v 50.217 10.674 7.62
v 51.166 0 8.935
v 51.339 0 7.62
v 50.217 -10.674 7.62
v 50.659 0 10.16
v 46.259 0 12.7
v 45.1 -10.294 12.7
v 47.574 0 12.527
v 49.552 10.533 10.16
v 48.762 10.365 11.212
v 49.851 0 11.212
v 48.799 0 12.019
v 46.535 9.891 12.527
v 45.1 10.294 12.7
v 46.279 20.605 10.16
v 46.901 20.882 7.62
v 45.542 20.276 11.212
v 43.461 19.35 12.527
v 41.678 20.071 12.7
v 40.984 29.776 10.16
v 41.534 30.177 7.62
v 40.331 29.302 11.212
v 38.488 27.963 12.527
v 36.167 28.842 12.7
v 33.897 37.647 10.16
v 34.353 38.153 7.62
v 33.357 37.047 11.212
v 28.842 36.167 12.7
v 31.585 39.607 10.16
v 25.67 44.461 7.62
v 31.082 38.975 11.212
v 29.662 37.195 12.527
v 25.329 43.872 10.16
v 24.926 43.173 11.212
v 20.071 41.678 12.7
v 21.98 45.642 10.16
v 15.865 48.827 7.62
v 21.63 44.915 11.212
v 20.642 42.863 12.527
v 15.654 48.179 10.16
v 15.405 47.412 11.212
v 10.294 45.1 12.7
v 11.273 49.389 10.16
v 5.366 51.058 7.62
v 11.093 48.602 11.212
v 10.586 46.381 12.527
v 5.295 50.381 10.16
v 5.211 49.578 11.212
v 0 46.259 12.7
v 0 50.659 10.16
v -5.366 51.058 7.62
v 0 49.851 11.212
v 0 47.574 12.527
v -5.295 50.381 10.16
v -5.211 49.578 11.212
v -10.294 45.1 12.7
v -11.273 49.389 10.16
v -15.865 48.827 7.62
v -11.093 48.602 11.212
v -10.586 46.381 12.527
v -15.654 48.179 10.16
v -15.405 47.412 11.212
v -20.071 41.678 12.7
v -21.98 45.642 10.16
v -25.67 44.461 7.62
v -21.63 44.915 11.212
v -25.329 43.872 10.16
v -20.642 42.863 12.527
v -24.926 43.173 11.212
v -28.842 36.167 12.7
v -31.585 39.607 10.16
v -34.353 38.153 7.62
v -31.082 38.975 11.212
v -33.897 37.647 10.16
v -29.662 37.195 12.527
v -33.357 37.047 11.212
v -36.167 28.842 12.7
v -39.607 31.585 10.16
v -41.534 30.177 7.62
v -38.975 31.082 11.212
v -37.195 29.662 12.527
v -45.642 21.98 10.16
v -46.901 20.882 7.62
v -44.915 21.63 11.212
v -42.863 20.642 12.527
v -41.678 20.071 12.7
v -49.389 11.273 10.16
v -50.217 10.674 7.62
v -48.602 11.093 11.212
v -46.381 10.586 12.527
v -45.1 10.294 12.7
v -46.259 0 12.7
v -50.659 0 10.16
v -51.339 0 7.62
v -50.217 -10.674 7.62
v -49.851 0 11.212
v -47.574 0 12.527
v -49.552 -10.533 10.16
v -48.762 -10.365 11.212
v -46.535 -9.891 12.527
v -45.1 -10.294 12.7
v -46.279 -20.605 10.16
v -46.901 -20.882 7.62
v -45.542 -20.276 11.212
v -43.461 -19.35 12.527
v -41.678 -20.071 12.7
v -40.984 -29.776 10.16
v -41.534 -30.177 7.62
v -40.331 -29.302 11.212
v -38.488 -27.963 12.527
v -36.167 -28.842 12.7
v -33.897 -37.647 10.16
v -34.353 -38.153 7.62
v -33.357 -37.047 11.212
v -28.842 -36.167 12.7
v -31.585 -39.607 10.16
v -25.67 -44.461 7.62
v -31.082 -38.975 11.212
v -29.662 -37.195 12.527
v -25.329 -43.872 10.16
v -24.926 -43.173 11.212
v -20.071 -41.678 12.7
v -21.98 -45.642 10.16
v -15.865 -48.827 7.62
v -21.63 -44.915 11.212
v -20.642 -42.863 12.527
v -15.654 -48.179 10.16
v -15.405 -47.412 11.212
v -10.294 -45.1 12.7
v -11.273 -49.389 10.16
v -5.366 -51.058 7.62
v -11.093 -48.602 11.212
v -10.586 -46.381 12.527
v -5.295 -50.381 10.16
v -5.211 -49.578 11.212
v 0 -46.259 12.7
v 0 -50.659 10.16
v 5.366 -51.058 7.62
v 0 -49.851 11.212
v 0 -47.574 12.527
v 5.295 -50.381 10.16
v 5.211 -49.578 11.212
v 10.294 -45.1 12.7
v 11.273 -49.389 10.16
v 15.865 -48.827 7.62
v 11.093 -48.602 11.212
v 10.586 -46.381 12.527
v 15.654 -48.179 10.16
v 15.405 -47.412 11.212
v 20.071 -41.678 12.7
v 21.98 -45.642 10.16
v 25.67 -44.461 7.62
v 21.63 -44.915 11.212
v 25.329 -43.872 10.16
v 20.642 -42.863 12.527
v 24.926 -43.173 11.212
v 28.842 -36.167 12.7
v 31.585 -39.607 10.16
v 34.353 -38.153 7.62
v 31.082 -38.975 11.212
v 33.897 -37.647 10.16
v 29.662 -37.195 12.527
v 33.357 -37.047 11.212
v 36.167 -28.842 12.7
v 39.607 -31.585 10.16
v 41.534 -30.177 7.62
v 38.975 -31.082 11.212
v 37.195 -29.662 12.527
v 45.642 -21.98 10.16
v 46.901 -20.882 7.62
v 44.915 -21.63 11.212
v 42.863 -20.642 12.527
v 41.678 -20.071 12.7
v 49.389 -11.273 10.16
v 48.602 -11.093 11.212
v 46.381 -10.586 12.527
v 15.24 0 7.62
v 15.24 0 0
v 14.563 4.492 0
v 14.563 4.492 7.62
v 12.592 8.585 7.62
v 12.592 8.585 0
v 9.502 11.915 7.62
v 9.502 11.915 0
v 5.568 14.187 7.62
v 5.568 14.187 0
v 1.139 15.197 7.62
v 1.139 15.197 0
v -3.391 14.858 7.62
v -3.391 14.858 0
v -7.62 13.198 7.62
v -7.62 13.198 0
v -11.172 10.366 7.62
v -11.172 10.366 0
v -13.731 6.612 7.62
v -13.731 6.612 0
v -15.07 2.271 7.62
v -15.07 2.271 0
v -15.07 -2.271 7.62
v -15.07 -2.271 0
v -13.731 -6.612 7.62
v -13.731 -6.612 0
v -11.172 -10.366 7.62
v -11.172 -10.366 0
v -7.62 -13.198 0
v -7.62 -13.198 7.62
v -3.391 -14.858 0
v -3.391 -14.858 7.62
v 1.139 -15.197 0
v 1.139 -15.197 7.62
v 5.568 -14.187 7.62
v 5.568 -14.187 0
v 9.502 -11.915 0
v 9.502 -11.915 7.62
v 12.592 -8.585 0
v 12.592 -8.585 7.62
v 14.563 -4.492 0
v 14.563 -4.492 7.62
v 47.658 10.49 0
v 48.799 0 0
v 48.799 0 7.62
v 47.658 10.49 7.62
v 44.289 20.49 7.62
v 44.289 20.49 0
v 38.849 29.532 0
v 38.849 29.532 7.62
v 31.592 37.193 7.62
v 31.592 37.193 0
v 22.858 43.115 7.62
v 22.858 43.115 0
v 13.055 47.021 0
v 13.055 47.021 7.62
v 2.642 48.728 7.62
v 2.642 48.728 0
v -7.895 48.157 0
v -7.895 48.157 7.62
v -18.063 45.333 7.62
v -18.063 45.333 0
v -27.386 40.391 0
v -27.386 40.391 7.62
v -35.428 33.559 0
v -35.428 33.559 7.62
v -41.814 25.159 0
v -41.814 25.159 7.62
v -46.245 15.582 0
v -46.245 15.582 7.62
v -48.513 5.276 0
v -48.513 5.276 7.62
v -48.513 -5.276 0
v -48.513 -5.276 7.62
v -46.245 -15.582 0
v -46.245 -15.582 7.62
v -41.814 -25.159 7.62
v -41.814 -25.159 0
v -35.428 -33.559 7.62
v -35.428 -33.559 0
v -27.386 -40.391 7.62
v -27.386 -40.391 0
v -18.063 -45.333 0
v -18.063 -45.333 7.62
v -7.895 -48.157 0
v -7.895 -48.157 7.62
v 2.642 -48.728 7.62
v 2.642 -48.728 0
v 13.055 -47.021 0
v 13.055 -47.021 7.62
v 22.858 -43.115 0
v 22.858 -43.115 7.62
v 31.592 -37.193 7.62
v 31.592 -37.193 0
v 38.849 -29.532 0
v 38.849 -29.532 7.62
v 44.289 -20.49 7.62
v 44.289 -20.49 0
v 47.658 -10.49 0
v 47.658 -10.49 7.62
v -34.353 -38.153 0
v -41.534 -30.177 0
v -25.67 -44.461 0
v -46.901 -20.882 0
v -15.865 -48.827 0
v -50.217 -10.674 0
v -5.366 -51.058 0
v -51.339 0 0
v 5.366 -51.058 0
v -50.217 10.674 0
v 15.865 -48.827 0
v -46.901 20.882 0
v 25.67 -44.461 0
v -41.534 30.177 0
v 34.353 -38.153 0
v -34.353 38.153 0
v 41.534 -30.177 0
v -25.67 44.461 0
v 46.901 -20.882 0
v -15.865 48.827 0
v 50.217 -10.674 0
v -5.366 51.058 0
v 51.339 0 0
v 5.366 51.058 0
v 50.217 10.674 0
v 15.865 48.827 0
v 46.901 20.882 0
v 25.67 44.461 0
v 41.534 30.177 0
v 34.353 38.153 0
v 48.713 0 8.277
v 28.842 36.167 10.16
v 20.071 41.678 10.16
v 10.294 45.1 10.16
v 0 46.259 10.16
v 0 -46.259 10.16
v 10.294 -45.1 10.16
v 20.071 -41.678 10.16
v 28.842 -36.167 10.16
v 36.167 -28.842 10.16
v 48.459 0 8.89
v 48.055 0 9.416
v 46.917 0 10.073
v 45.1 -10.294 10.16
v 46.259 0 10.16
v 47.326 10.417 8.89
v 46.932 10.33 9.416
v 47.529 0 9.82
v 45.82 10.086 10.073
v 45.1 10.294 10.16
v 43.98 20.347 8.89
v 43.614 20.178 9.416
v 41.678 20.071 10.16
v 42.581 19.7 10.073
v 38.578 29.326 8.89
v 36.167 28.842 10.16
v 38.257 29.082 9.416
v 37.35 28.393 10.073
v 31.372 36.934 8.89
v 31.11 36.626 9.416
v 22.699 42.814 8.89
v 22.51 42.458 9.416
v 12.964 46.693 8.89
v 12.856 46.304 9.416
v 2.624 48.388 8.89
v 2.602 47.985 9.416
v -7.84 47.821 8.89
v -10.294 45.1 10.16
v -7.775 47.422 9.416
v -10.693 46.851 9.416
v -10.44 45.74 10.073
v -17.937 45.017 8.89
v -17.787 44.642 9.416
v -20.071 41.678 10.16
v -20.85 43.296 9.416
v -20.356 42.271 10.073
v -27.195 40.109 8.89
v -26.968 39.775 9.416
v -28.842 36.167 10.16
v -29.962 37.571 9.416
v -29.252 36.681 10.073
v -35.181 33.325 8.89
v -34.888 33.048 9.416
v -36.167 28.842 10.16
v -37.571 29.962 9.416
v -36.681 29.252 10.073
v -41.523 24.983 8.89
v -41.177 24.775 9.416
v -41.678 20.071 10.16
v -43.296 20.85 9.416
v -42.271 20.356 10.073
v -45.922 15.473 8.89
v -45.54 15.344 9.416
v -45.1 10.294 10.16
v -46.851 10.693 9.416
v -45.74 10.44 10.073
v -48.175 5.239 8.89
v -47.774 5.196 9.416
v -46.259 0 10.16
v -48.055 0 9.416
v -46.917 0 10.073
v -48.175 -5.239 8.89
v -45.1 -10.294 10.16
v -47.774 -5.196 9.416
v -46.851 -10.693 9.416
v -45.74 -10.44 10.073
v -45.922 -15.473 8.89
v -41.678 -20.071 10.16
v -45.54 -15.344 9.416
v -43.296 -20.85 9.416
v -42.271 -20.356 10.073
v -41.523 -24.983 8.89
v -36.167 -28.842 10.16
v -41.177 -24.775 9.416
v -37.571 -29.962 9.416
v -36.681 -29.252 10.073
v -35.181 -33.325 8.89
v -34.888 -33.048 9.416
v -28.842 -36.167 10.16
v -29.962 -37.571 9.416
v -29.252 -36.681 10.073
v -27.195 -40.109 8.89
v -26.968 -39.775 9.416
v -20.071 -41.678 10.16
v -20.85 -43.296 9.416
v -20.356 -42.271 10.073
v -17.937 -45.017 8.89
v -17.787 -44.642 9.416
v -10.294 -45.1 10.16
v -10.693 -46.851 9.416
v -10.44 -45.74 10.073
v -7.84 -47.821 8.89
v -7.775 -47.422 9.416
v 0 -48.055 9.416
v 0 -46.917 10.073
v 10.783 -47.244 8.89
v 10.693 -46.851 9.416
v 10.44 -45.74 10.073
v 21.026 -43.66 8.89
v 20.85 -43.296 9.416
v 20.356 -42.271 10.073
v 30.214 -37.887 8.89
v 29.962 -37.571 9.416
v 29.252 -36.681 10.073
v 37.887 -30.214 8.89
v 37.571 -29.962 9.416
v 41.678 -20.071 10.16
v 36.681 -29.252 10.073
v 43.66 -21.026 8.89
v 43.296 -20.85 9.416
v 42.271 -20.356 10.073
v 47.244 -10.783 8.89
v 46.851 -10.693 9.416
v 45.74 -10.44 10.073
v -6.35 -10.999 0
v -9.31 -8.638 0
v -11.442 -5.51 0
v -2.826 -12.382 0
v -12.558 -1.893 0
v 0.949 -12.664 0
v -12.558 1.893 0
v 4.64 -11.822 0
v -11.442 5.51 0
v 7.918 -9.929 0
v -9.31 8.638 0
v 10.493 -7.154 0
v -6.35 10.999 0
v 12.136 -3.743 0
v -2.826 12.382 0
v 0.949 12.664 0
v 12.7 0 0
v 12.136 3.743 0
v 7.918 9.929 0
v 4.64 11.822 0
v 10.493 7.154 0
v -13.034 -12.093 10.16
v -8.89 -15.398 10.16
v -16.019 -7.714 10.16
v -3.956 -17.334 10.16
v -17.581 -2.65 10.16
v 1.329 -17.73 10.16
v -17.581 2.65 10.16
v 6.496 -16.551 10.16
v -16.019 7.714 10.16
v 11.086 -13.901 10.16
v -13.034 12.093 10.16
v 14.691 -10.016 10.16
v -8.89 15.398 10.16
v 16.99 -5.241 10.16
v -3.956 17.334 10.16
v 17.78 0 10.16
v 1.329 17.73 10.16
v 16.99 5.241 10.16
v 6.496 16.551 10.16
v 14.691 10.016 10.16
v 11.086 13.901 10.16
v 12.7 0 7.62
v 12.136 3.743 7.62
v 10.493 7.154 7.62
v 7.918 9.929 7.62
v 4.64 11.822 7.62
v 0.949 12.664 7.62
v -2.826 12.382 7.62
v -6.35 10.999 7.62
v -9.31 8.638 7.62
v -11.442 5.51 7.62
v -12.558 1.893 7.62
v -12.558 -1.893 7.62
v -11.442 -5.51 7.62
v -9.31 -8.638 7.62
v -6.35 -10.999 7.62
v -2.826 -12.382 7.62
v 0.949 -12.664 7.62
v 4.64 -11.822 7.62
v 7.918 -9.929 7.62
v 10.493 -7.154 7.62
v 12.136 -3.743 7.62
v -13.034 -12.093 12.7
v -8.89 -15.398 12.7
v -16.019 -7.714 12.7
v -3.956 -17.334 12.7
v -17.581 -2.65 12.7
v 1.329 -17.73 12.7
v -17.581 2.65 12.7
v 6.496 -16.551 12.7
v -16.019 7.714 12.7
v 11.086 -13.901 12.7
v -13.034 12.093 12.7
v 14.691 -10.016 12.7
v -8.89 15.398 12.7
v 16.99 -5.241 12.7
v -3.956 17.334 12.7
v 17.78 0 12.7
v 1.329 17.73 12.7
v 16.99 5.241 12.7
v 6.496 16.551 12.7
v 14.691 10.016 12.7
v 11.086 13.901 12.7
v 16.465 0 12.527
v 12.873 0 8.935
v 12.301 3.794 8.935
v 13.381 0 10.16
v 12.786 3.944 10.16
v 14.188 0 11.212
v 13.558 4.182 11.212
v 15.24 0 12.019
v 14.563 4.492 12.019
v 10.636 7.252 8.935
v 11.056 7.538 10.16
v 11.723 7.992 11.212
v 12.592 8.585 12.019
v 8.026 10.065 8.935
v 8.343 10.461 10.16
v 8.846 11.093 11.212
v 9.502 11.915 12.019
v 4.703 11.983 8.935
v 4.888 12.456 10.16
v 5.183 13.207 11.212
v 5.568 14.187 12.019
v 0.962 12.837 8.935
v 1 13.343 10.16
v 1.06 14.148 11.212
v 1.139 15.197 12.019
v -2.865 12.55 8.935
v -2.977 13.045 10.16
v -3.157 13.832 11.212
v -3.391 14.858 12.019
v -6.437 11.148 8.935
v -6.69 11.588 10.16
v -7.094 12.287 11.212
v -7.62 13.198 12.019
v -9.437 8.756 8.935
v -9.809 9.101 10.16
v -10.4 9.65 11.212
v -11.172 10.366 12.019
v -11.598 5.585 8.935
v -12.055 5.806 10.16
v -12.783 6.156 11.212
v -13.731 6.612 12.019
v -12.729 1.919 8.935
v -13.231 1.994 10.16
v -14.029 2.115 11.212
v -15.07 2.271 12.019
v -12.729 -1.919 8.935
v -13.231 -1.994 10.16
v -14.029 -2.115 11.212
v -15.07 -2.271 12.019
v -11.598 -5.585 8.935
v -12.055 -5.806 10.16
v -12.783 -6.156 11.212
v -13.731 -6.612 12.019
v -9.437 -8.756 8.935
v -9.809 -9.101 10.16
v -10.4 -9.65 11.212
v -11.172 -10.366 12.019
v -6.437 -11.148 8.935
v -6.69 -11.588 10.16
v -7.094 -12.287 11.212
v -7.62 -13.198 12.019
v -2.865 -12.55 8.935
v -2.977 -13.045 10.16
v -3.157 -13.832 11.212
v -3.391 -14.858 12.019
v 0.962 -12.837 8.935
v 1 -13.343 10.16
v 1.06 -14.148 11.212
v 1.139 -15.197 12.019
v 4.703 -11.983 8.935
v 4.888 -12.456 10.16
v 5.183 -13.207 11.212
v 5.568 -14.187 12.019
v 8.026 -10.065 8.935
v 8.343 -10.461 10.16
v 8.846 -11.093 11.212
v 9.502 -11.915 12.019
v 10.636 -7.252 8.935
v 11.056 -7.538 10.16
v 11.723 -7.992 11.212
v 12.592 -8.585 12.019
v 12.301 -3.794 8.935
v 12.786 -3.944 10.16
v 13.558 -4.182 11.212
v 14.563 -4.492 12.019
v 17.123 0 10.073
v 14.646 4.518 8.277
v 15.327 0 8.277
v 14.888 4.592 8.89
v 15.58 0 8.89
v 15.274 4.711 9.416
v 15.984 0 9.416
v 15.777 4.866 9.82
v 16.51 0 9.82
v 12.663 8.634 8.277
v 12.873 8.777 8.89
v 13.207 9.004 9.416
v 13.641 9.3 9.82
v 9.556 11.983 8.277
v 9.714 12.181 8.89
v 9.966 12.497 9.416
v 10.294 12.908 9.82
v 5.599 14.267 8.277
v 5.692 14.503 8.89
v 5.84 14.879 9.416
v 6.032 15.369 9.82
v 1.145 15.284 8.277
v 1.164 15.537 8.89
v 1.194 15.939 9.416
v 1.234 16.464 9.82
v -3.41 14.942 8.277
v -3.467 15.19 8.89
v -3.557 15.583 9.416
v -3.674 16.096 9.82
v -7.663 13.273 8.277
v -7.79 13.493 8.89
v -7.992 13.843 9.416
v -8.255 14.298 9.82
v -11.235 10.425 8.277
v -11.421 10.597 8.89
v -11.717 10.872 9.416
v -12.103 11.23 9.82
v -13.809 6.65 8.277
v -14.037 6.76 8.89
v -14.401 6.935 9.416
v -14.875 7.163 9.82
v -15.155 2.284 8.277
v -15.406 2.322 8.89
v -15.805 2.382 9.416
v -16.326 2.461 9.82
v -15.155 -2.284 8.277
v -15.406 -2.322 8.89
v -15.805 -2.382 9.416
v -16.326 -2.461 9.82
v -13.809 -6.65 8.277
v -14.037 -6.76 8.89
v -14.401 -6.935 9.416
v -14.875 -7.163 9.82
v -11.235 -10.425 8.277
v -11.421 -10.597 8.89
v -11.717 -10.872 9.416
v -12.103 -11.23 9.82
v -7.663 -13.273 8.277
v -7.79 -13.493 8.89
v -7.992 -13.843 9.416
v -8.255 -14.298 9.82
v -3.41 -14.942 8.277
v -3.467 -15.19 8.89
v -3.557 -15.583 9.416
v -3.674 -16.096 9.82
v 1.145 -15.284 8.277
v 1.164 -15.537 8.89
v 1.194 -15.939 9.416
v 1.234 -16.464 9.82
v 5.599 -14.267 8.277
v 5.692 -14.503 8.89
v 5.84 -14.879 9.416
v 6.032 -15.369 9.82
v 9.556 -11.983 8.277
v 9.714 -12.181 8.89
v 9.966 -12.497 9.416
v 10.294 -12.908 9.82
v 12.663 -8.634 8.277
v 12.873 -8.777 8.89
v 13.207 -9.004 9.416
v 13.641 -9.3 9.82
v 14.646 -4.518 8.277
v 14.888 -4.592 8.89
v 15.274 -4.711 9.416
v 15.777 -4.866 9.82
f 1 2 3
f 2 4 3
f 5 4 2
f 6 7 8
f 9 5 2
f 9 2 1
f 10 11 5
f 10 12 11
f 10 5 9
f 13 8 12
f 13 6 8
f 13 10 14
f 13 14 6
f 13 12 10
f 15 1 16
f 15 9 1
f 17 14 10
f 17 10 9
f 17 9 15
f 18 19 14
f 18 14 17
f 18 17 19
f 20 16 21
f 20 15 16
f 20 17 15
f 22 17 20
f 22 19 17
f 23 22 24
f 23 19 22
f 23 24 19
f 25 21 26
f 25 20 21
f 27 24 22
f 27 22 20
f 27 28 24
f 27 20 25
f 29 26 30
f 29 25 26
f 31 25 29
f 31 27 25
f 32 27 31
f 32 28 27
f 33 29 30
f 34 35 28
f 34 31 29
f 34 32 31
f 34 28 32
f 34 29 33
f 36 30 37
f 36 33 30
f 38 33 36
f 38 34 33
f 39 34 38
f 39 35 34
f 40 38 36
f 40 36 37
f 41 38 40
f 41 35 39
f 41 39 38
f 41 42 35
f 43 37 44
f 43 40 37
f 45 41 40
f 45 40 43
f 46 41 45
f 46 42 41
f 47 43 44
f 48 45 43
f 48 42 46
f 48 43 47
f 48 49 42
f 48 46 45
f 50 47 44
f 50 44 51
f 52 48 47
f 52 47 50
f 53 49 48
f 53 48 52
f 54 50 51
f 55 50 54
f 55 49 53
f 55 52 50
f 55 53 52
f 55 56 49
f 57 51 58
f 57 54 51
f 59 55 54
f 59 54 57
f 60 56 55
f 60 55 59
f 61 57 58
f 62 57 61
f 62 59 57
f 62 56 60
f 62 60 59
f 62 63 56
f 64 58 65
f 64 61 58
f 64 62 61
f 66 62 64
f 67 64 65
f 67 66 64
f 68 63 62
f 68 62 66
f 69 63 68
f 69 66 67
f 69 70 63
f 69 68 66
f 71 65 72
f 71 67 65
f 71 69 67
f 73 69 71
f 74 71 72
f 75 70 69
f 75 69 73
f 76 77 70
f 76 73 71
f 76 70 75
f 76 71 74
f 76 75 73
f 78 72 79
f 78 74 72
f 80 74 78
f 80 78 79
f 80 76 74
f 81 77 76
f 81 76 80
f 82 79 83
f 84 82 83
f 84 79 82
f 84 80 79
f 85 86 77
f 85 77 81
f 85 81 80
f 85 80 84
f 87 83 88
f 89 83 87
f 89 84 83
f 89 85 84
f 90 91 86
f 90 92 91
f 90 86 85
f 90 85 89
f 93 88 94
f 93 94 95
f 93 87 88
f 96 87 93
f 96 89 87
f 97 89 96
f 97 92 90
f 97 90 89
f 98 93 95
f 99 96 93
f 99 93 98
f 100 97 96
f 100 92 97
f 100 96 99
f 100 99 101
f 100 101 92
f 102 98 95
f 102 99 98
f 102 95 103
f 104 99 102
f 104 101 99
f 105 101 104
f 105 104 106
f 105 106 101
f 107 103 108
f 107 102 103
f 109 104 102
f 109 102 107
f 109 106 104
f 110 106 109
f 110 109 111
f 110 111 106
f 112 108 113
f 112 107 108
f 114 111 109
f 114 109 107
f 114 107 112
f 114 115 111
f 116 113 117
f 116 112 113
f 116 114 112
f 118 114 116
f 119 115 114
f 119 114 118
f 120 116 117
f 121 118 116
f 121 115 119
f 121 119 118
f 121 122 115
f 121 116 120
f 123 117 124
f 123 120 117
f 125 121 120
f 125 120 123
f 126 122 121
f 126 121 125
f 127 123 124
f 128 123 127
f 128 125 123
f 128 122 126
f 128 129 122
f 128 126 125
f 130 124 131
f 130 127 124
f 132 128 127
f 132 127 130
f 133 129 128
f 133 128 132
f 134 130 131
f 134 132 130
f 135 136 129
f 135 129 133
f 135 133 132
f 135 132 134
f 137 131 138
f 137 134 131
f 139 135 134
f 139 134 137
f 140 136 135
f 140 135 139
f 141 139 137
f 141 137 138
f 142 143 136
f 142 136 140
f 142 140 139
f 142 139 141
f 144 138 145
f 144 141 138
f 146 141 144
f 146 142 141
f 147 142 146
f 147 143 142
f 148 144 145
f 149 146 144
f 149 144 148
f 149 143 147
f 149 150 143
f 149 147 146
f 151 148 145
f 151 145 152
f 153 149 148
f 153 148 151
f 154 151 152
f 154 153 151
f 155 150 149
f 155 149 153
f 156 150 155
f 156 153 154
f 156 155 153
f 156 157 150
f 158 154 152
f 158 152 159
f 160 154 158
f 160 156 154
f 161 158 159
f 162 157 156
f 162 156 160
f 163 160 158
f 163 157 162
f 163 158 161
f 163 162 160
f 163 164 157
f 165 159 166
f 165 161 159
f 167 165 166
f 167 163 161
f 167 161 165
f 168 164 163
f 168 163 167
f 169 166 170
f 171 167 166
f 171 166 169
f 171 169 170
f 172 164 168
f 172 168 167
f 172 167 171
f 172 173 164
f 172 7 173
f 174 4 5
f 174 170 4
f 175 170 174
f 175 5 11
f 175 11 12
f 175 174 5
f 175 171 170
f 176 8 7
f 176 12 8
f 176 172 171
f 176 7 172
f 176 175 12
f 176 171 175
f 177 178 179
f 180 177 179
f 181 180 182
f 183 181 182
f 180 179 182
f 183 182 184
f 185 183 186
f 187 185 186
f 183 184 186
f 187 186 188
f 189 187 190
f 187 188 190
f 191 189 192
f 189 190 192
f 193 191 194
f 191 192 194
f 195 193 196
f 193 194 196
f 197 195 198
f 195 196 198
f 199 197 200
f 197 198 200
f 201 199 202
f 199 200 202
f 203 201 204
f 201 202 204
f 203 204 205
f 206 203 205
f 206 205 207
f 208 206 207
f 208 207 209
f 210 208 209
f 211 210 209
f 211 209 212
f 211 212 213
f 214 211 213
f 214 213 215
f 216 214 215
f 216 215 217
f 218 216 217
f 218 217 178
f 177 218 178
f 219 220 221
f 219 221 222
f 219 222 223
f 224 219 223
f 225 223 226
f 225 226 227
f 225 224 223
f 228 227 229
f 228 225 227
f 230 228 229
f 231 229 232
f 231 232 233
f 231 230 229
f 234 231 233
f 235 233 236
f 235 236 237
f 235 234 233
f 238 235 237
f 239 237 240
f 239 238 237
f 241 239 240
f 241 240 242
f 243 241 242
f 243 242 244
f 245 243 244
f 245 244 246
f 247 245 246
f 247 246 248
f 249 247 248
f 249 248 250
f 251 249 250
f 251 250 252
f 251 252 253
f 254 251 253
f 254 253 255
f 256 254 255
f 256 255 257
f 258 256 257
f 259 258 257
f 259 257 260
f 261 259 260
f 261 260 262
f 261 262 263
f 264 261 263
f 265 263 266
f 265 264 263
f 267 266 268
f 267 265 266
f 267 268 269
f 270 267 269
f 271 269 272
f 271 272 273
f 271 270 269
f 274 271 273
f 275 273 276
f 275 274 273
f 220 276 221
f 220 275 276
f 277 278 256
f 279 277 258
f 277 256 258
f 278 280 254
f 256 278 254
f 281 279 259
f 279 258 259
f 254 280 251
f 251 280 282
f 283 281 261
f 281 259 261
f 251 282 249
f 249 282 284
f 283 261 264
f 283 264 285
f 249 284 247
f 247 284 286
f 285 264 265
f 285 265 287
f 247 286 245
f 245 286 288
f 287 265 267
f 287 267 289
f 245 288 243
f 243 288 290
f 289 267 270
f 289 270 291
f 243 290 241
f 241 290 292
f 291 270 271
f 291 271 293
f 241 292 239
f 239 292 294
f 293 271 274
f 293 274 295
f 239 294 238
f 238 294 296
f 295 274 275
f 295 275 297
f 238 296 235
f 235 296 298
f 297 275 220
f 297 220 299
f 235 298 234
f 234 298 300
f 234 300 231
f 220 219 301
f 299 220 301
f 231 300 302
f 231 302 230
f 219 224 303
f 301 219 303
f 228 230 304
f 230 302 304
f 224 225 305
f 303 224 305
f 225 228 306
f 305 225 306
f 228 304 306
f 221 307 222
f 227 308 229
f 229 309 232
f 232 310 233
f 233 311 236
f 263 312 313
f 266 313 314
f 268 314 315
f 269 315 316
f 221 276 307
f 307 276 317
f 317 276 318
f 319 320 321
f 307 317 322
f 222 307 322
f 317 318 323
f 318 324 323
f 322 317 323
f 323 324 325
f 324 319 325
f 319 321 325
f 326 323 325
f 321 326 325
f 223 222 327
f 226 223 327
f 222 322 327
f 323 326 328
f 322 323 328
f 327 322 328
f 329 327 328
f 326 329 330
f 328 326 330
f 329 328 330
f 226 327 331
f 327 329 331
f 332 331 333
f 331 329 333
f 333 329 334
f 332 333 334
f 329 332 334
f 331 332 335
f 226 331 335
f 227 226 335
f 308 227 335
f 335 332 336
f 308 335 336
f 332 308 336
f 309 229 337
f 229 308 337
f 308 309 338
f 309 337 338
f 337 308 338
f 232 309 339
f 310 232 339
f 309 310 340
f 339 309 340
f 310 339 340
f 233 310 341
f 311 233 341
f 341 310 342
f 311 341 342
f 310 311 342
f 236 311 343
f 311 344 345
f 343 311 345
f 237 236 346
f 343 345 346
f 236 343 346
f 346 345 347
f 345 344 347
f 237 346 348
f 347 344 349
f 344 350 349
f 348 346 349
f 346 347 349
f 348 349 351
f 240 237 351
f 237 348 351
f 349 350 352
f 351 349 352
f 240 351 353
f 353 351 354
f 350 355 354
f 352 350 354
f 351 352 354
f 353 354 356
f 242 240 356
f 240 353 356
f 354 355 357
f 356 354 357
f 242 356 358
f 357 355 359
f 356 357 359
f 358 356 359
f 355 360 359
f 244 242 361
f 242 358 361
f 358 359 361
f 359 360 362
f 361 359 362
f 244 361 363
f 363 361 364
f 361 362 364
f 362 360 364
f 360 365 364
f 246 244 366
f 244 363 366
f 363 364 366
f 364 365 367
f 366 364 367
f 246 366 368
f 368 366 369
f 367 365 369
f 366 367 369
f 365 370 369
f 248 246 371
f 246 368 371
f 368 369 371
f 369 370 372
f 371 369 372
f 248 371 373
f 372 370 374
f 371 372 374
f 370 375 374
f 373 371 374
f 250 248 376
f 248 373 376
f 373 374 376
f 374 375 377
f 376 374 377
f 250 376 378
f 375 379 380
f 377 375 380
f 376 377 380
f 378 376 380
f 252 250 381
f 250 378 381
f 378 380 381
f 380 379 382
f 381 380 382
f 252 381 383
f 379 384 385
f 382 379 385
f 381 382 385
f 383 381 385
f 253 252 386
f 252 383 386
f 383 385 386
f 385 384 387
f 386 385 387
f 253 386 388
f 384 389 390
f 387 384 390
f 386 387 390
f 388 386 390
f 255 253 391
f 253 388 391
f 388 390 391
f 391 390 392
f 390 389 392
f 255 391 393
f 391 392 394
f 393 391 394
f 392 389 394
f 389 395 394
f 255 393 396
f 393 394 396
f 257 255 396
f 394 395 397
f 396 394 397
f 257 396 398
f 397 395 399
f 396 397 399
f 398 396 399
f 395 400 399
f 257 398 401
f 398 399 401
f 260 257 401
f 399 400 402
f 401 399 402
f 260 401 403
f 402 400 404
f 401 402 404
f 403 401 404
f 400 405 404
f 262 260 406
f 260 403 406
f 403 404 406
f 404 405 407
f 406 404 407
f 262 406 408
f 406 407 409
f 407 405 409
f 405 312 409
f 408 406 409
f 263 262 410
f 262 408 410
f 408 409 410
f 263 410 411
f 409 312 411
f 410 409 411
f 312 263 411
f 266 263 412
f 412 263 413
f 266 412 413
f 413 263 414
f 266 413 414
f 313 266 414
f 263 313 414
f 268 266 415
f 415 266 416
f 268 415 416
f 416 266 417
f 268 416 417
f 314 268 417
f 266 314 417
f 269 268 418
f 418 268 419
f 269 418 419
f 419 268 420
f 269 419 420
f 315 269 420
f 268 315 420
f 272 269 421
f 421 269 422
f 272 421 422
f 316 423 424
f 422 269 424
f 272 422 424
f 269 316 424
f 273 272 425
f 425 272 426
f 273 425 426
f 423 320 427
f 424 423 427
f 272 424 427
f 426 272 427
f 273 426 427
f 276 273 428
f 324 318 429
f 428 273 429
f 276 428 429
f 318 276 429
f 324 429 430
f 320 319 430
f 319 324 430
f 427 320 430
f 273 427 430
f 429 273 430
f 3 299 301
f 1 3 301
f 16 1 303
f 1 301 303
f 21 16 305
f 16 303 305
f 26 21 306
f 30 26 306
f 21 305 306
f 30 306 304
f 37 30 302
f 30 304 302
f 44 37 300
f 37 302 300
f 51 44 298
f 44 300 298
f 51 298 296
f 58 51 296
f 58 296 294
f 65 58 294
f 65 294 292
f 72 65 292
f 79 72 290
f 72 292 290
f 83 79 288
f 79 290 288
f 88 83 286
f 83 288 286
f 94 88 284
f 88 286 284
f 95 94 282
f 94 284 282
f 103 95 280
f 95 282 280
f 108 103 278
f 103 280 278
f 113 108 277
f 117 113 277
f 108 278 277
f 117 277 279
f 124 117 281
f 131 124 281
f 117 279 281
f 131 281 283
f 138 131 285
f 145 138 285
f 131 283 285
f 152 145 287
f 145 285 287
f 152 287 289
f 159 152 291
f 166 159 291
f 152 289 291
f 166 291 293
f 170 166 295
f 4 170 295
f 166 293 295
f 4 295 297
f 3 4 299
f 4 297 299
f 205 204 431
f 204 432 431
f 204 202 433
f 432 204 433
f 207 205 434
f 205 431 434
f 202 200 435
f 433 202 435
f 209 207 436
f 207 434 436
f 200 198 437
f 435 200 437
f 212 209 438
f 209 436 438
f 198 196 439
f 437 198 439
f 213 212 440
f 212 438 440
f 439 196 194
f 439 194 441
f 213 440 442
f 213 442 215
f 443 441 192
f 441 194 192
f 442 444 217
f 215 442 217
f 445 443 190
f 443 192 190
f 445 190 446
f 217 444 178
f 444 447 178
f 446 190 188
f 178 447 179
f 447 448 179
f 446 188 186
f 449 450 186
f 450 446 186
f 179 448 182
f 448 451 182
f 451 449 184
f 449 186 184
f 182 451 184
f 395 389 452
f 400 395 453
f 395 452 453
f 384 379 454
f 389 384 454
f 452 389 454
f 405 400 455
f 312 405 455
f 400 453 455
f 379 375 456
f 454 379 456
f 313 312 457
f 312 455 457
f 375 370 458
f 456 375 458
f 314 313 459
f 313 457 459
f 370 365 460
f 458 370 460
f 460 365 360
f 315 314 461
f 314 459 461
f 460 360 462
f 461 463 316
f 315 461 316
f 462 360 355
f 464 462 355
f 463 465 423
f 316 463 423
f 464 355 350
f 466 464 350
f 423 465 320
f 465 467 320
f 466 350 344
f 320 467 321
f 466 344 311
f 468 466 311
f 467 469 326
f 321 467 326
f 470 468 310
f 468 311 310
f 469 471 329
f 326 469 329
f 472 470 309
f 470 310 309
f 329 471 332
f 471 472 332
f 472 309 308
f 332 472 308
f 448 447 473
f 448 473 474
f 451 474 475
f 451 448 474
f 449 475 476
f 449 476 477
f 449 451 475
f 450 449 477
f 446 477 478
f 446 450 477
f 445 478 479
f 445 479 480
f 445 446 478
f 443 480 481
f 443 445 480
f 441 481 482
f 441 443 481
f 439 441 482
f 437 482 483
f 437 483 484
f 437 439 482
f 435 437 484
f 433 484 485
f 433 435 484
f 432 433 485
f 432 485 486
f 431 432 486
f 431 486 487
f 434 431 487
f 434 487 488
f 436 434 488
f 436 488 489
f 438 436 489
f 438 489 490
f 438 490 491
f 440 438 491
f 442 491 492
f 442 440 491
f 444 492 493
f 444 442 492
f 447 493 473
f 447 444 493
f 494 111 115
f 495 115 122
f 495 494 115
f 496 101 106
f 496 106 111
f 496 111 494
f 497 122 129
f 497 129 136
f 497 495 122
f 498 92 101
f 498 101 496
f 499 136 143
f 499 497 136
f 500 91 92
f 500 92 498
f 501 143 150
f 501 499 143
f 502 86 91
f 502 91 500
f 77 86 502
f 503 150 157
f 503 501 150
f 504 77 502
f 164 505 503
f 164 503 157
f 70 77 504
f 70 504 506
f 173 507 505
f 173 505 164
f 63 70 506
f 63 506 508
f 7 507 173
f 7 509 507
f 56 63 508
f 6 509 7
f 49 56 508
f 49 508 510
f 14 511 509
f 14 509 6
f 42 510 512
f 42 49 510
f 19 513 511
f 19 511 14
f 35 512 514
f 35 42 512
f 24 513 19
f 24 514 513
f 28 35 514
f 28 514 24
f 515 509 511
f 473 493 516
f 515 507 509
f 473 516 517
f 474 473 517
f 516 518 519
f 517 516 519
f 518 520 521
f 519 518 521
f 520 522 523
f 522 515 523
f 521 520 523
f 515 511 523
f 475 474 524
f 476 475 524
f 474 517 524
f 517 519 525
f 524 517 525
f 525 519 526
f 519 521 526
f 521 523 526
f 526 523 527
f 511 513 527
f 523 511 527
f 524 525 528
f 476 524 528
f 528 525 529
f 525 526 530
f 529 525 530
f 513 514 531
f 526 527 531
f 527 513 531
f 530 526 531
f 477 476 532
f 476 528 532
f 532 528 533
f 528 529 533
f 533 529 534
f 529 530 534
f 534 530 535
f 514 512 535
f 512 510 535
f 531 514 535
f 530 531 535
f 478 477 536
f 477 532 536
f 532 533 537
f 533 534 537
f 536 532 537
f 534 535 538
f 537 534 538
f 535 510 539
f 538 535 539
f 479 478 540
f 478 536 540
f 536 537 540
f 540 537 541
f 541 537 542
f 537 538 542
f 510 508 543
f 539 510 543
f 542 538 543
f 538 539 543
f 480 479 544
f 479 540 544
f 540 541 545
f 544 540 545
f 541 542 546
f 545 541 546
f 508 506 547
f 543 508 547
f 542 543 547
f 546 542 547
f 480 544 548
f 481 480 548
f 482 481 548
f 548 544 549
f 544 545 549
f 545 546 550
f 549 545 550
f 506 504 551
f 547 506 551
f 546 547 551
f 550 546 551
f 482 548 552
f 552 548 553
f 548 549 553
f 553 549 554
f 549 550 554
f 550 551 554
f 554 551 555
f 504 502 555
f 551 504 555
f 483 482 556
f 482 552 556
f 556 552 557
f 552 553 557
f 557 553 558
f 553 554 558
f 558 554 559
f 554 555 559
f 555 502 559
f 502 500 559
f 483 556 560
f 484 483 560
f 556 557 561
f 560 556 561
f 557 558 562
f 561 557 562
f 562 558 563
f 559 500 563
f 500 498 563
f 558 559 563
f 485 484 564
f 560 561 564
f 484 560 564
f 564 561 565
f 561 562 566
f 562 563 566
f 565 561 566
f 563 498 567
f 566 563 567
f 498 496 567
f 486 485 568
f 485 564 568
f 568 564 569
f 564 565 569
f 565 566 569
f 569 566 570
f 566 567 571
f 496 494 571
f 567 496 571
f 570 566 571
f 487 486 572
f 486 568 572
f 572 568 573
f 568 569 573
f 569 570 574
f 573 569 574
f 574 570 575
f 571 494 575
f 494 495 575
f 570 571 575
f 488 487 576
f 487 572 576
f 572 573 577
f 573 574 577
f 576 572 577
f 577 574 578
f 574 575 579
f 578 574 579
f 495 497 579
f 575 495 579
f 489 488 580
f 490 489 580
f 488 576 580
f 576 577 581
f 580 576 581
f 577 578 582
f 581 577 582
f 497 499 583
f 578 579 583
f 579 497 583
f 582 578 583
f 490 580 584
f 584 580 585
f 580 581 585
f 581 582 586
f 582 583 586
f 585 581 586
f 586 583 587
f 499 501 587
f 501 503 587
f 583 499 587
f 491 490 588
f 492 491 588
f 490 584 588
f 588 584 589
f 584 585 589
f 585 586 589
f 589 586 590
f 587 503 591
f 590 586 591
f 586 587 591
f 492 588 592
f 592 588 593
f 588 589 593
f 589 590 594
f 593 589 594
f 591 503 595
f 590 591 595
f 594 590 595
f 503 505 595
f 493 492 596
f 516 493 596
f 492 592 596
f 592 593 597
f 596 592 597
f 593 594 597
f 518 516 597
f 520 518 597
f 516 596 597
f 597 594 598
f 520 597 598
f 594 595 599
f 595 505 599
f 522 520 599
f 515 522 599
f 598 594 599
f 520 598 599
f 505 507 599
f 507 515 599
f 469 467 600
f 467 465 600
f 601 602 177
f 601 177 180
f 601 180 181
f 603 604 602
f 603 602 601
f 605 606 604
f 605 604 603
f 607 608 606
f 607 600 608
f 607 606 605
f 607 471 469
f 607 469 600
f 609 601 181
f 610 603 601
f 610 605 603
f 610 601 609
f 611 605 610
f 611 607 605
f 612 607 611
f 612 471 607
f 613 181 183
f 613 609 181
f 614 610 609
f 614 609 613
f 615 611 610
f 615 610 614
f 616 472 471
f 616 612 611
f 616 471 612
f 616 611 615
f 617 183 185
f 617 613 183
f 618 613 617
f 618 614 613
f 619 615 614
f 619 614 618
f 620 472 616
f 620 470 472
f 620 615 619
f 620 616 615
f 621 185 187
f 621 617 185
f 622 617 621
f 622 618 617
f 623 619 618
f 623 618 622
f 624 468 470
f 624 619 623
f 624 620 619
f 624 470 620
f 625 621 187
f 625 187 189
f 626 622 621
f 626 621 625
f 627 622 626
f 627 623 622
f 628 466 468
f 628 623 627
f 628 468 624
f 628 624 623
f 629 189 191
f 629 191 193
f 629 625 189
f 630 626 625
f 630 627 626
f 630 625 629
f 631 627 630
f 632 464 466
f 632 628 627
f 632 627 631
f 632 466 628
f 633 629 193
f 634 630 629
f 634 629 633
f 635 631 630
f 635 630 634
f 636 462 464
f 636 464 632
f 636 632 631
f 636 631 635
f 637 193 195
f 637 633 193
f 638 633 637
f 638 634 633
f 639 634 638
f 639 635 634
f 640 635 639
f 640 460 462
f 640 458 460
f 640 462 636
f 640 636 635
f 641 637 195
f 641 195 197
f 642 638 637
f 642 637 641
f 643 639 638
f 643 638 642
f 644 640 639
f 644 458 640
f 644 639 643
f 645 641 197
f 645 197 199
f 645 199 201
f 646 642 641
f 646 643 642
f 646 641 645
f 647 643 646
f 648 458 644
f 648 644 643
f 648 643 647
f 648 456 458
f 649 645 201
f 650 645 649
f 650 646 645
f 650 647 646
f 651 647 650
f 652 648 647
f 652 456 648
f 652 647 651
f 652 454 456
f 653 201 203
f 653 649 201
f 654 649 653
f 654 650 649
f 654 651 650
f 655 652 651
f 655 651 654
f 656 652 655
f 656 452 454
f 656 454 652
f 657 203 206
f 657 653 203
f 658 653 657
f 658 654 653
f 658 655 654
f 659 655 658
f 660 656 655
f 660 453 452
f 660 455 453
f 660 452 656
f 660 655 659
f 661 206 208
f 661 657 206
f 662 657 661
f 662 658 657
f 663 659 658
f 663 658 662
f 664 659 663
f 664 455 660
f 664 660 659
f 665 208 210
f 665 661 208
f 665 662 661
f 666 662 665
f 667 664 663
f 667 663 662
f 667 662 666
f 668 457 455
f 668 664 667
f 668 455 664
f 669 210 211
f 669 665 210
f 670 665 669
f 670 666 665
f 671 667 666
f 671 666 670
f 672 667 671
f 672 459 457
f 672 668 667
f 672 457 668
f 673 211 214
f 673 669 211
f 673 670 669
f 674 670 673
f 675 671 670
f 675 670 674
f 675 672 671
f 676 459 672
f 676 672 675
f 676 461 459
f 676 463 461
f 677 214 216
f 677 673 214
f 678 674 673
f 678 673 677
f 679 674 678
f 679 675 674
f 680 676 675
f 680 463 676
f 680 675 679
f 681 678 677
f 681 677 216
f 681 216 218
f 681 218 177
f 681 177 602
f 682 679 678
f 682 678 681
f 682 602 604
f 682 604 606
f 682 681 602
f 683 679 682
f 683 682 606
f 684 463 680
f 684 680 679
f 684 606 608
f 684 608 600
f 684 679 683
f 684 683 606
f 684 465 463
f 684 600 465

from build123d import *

# Parameters (mm, degrees)
F0_R     = 51.33938
F0_R_2   = 12.7
F1_DEPTH = 12.7
F2_R     = 5.08
F3_T     = -2.54


with BuildPart() as f1:
    # F0 (on Top) → F1 (new body)
    with BuildSketch(Plane.XY):
        Circle(F0_R)
        Circle(F0_R_2, mode=Mode.SUBTRACT)
    extrude(amount=F1_DEPTH)

    # F2
    f2_edges = [f1.edges().sort_by_distance(p)[0] for p in [
        (-51.33938, 0, 12.7),
        (-12.7, 0, 12.7),
    ]]
    fillet(f2_edges, radius=F2_R)

    # F3
    f3_openings = [f1.faces().sort_by_distance(p)[0] for p in [
        (-49.887283, 0, 0),
    ]]
    offset(amount=F3_T, openings=f3_openings)


solid = f1.part
